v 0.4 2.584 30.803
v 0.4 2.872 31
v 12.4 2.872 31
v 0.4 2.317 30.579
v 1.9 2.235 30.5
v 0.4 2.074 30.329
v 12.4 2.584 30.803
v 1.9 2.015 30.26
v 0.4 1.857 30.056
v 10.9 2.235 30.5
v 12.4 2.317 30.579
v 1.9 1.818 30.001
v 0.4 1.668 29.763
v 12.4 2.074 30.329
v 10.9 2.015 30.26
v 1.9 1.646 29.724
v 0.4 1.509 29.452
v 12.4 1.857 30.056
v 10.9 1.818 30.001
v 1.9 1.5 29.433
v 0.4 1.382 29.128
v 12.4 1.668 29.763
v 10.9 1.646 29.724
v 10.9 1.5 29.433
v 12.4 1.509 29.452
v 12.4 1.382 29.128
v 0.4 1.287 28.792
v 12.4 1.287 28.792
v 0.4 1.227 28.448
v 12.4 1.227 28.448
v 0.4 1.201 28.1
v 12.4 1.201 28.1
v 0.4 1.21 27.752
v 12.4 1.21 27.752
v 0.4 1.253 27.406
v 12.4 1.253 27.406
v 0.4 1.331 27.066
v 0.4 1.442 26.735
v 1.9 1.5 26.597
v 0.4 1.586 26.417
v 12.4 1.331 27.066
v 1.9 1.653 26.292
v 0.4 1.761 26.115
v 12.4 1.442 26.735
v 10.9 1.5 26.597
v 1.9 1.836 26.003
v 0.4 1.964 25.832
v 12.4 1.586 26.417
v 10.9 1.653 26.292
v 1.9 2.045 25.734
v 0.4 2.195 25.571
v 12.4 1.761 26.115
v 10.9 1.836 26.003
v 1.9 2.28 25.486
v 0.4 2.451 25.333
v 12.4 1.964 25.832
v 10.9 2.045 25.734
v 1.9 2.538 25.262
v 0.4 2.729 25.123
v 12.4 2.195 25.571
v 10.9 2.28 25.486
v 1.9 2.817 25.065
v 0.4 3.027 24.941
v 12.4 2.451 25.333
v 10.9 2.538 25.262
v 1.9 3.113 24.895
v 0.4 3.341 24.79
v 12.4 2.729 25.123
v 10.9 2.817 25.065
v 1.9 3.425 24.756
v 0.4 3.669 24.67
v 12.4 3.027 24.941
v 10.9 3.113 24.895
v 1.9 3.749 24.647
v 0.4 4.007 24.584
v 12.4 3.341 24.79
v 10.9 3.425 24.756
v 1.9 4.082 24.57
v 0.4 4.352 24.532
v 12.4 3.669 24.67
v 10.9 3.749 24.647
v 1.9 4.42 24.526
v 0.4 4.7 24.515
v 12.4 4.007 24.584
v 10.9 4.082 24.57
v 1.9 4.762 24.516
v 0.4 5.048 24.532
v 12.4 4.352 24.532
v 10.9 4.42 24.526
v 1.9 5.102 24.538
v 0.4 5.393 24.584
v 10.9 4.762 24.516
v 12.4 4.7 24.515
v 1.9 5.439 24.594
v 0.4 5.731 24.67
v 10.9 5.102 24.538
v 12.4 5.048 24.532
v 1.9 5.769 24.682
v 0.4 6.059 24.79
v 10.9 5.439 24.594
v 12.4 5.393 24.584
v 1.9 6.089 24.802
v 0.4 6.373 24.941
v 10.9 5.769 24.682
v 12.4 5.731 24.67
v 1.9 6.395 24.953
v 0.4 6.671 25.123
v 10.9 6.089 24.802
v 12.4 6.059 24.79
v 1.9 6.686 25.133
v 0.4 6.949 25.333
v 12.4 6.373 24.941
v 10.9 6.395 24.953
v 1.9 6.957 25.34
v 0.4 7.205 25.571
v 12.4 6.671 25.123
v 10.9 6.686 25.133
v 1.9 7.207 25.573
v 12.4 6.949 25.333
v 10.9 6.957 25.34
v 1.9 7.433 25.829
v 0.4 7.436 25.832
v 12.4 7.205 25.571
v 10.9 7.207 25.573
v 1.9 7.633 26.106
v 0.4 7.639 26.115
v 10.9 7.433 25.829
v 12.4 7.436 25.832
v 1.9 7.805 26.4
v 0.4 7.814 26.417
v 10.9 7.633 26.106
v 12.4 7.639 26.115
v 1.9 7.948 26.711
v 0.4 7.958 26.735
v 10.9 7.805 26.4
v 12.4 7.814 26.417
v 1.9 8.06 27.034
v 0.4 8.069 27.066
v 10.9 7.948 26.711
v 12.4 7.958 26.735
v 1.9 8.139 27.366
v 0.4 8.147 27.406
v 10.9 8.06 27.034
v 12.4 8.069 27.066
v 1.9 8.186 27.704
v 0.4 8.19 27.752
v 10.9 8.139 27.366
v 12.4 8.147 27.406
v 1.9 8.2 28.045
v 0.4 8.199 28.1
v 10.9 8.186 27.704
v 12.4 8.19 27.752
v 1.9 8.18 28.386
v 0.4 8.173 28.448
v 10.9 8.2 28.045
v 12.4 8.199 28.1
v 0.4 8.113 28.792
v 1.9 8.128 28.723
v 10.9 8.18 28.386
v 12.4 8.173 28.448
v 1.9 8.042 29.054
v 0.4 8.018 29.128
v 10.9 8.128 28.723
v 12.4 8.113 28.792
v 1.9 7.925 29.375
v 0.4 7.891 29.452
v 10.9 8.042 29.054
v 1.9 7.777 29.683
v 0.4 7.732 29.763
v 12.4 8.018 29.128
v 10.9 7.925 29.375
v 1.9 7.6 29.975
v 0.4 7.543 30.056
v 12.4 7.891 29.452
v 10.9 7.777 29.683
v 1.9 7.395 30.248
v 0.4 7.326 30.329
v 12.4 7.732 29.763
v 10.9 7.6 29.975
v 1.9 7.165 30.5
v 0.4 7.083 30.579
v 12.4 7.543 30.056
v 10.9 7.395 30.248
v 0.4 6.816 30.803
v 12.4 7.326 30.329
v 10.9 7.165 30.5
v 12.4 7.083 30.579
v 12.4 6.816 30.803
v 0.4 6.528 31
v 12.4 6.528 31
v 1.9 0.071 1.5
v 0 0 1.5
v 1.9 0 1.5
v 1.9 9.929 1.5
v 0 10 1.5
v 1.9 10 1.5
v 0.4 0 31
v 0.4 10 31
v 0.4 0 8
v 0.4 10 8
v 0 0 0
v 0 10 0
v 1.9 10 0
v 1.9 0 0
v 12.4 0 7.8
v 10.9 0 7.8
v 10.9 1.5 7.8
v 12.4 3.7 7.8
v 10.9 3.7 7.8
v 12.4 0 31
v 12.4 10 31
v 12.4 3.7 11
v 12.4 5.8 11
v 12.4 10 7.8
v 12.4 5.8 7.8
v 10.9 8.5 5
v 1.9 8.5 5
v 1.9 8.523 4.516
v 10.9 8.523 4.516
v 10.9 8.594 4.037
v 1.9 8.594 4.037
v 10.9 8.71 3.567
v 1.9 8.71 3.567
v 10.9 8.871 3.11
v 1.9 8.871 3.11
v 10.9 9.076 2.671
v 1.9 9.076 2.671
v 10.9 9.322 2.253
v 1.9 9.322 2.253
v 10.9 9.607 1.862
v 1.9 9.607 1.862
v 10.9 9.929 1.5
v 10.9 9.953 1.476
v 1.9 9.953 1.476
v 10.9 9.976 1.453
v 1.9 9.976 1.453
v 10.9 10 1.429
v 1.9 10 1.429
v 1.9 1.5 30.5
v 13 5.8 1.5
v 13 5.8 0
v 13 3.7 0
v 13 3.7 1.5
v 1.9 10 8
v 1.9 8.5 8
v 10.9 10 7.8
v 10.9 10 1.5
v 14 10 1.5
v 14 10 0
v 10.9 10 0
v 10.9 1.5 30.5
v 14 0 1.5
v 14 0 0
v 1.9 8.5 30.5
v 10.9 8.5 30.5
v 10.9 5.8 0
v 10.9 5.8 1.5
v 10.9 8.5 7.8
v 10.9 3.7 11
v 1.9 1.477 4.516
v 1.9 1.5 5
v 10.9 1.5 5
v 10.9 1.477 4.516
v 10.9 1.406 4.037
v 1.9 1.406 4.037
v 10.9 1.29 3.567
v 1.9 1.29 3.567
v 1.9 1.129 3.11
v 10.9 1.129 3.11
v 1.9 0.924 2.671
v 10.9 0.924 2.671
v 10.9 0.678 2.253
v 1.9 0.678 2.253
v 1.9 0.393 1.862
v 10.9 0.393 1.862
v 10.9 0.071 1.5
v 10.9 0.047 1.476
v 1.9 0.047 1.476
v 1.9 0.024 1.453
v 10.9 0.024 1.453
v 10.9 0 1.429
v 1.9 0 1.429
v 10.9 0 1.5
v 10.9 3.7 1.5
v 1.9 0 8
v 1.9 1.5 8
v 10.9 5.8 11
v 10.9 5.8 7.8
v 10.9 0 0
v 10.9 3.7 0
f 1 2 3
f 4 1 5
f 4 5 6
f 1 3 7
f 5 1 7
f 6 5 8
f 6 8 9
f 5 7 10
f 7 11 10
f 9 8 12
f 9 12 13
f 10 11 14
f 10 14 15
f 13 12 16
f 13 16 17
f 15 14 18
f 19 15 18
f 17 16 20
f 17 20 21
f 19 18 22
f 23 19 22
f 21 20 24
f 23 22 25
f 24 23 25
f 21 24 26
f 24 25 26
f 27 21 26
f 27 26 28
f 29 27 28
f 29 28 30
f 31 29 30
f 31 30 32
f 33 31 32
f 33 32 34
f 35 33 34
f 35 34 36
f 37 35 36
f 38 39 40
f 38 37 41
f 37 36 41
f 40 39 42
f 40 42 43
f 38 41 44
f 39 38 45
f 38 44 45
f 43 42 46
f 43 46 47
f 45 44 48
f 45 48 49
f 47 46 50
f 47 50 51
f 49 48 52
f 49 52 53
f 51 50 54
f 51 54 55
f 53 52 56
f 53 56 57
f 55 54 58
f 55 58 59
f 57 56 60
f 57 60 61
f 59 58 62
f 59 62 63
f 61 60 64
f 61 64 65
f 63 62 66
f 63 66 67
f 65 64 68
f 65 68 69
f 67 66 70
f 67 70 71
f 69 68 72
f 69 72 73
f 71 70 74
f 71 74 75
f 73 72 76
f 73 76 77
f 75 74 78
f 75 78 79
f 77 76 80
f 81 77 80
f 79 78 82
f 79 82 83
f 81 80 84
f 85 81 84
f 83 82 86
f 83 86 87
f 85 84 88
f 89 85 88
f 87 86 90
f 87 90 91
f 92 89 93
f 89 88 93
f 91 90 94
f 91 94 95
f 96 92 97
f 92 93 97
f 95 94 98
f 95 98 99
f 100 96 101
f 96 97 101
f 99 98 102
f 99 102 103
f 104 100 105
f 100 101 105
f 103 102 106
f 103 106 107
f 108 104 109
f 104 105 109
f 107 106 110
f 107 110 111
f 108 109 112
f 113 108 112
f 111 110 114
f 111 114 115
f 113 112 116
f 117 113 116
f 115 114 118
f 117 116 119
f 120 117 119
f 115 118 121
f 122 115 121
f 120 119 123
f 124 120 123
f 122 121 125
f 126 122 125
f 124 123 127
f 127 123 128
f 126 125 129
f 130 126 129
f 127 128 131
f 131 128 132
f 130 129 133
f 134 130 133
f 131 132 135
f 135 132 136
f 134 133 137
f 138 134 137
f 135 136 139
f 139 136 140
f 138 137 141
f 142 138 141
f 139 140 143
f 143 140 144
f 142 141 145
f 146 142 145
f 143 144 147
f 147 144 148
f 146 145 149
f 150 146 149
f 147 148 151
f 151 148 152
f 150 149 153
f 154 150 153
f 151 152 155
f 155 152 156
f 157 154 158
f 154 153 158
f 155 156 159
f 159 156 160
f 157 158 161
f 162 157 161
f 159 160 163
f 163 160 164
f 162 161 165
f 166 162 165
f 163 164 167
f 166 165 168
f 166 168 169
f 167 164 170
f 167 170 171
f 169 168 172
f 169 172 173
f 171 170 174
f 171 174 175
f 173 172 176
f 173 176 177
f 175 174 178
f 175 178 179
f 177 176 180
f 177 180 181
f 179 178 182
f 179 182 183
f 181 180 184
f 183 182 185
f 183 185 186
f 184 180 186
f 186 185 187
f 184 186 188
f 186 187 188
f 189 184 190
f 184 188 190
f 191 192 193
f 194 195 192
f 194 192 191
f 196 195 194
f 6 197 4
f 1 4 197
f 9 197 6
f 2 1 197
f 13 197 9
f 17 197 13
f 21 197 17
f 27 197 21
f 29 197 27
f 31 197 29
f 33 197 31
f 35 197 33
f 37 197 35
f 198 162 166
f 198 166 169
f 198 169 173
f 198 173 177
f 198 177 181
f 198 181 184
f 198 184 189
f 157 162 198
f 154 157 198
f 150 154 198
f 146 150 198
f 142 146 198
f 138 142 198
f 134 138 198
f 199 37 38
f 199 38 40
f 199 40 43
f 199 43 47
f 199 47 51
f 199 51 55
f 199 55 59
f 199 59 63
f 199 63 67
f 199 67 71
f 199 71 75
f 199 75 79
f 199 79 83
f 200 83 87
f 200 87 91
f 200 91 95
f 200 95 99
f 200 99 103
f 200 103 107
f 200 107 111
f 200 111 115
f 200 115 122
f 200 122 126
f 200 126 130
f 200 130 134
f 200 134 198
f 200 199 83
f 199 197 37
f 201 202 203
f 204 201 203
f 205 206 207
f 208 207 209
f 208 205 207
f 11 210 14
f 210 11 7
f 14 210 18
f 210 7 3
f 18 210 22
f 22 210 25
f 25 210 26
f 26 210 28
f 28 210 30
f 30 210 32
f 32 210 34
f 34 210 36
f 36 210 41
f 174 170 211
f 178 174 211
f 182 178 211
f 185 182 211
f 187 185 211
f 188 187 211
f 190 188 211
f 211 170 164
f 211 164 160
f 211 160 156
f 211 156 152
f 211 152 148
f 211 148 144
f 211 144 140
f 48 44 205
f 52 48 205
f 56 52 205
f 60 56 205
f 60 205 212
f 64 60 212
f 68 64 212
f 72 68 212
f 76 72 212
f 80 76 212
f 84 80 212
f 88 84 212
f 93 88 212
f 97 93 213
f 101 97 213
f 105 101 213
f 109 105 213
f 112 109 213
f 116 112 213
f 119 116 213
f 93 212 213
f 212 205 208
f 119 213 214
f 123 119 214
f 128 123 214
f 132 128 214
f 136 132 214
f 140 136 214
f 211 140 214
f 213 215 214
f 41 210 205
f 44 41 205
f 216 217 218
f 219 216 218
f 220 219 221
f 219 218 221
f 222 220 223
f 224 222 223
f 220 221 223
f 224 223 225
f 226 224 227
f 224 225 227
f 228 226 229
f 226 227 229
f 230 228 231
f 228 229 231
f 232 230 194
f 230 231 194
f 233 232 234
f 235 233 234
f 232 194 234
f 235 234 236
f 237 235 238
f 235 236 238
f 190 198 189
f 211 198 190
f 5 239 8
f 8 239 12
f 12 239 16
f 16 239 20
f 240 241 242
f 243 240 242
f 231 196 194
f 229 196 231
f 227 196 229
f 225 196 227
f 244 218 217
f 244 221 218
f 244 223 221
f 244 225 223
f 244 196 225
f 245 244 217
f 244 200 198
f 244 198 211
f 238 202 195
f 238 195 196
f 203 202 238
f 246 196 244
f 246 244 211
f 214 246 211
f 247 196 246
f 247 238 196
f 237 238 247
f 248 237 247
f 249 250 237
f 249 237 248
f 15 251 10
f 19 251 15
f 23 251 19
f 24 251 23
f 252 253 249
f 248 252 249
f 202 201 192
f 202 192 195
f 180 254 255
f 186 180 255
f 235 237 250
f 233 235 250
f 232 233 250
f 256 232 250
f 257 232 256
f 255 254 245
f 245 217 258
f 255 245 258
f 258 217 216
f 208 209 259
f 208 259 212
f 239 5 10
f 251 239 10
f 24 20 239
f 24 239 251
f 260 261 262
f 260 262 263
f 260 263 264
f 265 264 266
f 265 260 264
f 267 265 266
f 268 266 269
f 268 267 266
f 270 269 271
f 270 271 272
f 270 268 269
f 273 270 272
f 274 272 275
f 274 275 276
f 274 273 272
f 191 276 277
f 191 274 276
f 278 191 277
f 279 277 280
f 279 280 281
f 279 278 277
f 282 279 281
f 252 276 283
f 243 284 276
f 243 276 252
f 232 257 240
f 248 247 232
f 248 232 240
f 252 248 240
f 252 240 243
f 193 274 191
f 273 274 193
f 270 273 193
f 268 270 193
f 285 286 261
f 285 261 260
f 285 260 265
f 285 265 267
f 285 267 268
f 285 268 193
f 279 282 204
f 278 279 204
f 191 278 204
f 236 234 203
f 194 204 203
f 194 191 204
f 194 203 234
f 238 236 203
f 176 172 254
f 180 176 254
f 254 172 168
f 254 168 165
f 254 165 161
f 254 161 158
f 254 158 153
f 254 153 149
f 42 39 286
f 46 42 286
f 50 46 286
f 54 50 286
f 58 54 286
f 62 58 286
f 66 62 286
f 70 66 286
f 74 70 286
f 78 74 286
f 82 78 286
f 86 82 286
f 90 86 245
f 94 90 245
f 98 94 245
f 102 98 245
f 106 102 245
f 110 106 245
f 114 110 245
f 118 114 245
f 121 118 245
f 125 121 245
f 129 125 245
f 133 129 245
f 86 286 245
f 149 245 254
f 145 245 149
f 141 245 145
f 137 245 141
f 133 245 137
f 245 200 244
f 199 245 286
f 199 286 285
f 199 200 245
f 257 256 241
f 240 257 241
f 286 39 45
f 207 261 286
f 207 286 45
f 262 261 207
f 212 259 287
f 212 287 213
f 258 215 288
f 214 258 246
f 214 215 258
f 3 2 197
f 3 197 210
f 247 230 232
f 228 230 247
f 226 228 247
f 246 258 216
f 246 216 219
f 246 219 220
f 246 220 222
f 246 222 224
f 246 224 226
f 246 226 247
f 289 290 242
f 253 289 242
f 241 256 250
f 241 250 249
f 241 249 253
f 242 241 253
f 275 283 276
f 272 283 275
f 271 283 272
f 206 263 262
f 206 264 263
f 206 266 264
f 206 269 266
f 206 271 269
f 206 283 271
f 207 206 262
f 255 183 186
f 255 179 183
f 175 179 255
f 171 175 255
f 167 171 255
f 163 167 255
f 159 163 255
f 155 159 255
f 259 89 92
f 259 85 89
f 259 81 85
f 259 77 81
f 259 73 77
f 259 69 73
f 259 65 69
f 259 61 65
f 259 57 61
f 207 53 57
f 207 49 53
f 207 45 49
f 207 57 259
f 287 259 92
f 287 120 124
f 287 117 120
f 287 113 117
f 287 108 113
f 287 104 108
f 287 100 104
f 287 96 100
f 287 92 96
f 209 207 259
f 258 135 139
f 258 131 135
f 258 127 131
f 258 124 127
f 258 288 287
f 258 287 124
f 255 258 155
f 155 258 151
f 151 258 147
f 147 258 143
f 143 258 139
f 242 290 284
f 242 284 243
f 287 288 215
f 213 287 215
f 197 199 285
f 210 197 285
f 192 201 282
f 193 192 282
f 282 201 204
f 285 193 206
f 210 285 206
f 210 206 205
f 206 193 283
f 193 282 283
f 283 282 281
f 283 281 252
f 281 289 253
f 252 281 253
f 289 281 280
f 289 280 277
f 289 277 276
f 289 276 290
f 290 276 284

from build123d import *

# Parameters (mm, degrees)
F0_W         = 14
F0_H         = 10
F1_DEPTH     = 1.5
F2_W         = 9
F2_H         = 7
F3_DEPTH     = 25
F4_W         = 12
F4_H         = 10
F4_W_2       = 9
F4_H_2       = 7
F5_DEPTH     = 29
F6_W         = 12
F6_H         = 10
F7_DEPTH     = 0.5
F8_R         = 3.5
F9_DEPTH     = 25
F10_W        = 2.1
F10_H        = 2.1
F11_DEPTH    = 11
F12_W        = 10
F12_H        = 6.5
F13_DEPTH    = 1.5
F14_W        = 10
F14_H        = 6.3
F15_DEPTH    = 1.5
F16_T1_DEPTH = 9


# Not quite as in the source:
# - a fillet or chamfer that OpenCascade refuses, or shapes differently, is made with other operations: its cross-section is extruded or revolved along the edge and cut away or added


with BuildPart() as f1:
    # F0 (on Top) → F1 (new body)
    with BuildSketch(Plane.XY):
        with Locations((7, 5)):
            Rectangle(F0_W, F0_H)
    extrude(amount=F1_DEPTH)

    # F2 (on face) → F3 (cut)
    with BuildSketch(Plane.XY.offset(1.5)):
        with Locations((6.4, 5)):
            Rectangle(F2_W, F2_H)
    extrude(amount=-F3_DEPTH, mode=Mode.SUBTRACT)

    # F4 (on face) → F5 (join)
    with BuildSketch(Plane.XY.offset(1.5)):
        with Locations((6.4, 5)):
            Rectangle(F4_W, F4_H)
        with Locations((6.4, 5)):
            Rectangle(F4_W_2, F4_H_2, mode=Mode.SUBTRACT)
    extrude(amount=F5_DEPTH)

    # F6 (on face) → F7 (join)
    with BuildSketch(Plane.XY.offset(30.5)):
        with Locations((6.4, 5)):
            Rectangle(F6_W, F6_H)
    extrude(amount=F7_DEPTH)

    # F8 (on face) → F9 (cut)
    with BuildSketch(Plane.YZ.offset(12.4)):
        with Locations((4.7, 28.0150376887)):
            Circle(F8_R)
    extrude(amount=-F9_DEPTH, mode=Mode.SUBTRACT)

    # F10 (on face) → F11 (cut)
    with BuildSketch(Plane(origin=(0, 0, 0), x_dir=(1, 0, 0), z_dir=(0, 0, -1))):
        with Locations((11.95, -4.75)):
            Rectangle(F10_W, F10_H)
    extrude(amount=-F11_DEPTH, mode=Mode.SUBTRACT)

    # F12 (on face) → F13 (cut)
    with BuildSketch(Plane(origin=(0.4, 0, 0), x_dir=(0, -1, 0), z_dir=(-1, 0, 0))):
        with Locations((-5, 4.75)):
            Rectangle(F12_W, F12_H)
    extrude(amount=-F13_DEPTH, mode=Mode.SUBTRACT)

    # F14 (on face) → F15 (cut)
    with BuildSketch(Plane.YZ.offset(12.4)):
        with Locations((5, 4.65)):
            Rectangle(F14_W, F14_H)
    extrude(amount=-F15_DEPTH, mode=Mode.SUBTRACT)

    # F16: fillet of radius 5 on 2 edges, made by hand

    # F16_s2 → F16_t1 (cut)
    with BuildSketch(Plane.YZ.offset(1.9)):
        with BuildLine():
            ThreePointArc((8.5, 5), (9.9644660941, 1.4644660941), (13.5, 0))
            Line((13.5, 0), (13.5, -0.1))
            Line((13.5, -0.1), (8.4, -0.1))
            Line((8.4, -0.1), (8.4, 5))
            Line((8.4, 5), (8.5, 5))
        make_face()
        with BuildLine():
            ThreePointArc((1.5, 5), (0.0355339059, 1.4644660941), (-3.5, 0))
            Line((-3.5, 0), (-3.5, -0.1))
            Line((-3.5, -0.1), (1.6, -0.1))
            Line((1.6, -0.1), (1.6, 5))
            Line((1.6, 5), (1.5, 5))
        make_face()
    extrude(amount=F16_T1_DEPTH, mode=Mode.SUBTRACT)


solid = f1.part
